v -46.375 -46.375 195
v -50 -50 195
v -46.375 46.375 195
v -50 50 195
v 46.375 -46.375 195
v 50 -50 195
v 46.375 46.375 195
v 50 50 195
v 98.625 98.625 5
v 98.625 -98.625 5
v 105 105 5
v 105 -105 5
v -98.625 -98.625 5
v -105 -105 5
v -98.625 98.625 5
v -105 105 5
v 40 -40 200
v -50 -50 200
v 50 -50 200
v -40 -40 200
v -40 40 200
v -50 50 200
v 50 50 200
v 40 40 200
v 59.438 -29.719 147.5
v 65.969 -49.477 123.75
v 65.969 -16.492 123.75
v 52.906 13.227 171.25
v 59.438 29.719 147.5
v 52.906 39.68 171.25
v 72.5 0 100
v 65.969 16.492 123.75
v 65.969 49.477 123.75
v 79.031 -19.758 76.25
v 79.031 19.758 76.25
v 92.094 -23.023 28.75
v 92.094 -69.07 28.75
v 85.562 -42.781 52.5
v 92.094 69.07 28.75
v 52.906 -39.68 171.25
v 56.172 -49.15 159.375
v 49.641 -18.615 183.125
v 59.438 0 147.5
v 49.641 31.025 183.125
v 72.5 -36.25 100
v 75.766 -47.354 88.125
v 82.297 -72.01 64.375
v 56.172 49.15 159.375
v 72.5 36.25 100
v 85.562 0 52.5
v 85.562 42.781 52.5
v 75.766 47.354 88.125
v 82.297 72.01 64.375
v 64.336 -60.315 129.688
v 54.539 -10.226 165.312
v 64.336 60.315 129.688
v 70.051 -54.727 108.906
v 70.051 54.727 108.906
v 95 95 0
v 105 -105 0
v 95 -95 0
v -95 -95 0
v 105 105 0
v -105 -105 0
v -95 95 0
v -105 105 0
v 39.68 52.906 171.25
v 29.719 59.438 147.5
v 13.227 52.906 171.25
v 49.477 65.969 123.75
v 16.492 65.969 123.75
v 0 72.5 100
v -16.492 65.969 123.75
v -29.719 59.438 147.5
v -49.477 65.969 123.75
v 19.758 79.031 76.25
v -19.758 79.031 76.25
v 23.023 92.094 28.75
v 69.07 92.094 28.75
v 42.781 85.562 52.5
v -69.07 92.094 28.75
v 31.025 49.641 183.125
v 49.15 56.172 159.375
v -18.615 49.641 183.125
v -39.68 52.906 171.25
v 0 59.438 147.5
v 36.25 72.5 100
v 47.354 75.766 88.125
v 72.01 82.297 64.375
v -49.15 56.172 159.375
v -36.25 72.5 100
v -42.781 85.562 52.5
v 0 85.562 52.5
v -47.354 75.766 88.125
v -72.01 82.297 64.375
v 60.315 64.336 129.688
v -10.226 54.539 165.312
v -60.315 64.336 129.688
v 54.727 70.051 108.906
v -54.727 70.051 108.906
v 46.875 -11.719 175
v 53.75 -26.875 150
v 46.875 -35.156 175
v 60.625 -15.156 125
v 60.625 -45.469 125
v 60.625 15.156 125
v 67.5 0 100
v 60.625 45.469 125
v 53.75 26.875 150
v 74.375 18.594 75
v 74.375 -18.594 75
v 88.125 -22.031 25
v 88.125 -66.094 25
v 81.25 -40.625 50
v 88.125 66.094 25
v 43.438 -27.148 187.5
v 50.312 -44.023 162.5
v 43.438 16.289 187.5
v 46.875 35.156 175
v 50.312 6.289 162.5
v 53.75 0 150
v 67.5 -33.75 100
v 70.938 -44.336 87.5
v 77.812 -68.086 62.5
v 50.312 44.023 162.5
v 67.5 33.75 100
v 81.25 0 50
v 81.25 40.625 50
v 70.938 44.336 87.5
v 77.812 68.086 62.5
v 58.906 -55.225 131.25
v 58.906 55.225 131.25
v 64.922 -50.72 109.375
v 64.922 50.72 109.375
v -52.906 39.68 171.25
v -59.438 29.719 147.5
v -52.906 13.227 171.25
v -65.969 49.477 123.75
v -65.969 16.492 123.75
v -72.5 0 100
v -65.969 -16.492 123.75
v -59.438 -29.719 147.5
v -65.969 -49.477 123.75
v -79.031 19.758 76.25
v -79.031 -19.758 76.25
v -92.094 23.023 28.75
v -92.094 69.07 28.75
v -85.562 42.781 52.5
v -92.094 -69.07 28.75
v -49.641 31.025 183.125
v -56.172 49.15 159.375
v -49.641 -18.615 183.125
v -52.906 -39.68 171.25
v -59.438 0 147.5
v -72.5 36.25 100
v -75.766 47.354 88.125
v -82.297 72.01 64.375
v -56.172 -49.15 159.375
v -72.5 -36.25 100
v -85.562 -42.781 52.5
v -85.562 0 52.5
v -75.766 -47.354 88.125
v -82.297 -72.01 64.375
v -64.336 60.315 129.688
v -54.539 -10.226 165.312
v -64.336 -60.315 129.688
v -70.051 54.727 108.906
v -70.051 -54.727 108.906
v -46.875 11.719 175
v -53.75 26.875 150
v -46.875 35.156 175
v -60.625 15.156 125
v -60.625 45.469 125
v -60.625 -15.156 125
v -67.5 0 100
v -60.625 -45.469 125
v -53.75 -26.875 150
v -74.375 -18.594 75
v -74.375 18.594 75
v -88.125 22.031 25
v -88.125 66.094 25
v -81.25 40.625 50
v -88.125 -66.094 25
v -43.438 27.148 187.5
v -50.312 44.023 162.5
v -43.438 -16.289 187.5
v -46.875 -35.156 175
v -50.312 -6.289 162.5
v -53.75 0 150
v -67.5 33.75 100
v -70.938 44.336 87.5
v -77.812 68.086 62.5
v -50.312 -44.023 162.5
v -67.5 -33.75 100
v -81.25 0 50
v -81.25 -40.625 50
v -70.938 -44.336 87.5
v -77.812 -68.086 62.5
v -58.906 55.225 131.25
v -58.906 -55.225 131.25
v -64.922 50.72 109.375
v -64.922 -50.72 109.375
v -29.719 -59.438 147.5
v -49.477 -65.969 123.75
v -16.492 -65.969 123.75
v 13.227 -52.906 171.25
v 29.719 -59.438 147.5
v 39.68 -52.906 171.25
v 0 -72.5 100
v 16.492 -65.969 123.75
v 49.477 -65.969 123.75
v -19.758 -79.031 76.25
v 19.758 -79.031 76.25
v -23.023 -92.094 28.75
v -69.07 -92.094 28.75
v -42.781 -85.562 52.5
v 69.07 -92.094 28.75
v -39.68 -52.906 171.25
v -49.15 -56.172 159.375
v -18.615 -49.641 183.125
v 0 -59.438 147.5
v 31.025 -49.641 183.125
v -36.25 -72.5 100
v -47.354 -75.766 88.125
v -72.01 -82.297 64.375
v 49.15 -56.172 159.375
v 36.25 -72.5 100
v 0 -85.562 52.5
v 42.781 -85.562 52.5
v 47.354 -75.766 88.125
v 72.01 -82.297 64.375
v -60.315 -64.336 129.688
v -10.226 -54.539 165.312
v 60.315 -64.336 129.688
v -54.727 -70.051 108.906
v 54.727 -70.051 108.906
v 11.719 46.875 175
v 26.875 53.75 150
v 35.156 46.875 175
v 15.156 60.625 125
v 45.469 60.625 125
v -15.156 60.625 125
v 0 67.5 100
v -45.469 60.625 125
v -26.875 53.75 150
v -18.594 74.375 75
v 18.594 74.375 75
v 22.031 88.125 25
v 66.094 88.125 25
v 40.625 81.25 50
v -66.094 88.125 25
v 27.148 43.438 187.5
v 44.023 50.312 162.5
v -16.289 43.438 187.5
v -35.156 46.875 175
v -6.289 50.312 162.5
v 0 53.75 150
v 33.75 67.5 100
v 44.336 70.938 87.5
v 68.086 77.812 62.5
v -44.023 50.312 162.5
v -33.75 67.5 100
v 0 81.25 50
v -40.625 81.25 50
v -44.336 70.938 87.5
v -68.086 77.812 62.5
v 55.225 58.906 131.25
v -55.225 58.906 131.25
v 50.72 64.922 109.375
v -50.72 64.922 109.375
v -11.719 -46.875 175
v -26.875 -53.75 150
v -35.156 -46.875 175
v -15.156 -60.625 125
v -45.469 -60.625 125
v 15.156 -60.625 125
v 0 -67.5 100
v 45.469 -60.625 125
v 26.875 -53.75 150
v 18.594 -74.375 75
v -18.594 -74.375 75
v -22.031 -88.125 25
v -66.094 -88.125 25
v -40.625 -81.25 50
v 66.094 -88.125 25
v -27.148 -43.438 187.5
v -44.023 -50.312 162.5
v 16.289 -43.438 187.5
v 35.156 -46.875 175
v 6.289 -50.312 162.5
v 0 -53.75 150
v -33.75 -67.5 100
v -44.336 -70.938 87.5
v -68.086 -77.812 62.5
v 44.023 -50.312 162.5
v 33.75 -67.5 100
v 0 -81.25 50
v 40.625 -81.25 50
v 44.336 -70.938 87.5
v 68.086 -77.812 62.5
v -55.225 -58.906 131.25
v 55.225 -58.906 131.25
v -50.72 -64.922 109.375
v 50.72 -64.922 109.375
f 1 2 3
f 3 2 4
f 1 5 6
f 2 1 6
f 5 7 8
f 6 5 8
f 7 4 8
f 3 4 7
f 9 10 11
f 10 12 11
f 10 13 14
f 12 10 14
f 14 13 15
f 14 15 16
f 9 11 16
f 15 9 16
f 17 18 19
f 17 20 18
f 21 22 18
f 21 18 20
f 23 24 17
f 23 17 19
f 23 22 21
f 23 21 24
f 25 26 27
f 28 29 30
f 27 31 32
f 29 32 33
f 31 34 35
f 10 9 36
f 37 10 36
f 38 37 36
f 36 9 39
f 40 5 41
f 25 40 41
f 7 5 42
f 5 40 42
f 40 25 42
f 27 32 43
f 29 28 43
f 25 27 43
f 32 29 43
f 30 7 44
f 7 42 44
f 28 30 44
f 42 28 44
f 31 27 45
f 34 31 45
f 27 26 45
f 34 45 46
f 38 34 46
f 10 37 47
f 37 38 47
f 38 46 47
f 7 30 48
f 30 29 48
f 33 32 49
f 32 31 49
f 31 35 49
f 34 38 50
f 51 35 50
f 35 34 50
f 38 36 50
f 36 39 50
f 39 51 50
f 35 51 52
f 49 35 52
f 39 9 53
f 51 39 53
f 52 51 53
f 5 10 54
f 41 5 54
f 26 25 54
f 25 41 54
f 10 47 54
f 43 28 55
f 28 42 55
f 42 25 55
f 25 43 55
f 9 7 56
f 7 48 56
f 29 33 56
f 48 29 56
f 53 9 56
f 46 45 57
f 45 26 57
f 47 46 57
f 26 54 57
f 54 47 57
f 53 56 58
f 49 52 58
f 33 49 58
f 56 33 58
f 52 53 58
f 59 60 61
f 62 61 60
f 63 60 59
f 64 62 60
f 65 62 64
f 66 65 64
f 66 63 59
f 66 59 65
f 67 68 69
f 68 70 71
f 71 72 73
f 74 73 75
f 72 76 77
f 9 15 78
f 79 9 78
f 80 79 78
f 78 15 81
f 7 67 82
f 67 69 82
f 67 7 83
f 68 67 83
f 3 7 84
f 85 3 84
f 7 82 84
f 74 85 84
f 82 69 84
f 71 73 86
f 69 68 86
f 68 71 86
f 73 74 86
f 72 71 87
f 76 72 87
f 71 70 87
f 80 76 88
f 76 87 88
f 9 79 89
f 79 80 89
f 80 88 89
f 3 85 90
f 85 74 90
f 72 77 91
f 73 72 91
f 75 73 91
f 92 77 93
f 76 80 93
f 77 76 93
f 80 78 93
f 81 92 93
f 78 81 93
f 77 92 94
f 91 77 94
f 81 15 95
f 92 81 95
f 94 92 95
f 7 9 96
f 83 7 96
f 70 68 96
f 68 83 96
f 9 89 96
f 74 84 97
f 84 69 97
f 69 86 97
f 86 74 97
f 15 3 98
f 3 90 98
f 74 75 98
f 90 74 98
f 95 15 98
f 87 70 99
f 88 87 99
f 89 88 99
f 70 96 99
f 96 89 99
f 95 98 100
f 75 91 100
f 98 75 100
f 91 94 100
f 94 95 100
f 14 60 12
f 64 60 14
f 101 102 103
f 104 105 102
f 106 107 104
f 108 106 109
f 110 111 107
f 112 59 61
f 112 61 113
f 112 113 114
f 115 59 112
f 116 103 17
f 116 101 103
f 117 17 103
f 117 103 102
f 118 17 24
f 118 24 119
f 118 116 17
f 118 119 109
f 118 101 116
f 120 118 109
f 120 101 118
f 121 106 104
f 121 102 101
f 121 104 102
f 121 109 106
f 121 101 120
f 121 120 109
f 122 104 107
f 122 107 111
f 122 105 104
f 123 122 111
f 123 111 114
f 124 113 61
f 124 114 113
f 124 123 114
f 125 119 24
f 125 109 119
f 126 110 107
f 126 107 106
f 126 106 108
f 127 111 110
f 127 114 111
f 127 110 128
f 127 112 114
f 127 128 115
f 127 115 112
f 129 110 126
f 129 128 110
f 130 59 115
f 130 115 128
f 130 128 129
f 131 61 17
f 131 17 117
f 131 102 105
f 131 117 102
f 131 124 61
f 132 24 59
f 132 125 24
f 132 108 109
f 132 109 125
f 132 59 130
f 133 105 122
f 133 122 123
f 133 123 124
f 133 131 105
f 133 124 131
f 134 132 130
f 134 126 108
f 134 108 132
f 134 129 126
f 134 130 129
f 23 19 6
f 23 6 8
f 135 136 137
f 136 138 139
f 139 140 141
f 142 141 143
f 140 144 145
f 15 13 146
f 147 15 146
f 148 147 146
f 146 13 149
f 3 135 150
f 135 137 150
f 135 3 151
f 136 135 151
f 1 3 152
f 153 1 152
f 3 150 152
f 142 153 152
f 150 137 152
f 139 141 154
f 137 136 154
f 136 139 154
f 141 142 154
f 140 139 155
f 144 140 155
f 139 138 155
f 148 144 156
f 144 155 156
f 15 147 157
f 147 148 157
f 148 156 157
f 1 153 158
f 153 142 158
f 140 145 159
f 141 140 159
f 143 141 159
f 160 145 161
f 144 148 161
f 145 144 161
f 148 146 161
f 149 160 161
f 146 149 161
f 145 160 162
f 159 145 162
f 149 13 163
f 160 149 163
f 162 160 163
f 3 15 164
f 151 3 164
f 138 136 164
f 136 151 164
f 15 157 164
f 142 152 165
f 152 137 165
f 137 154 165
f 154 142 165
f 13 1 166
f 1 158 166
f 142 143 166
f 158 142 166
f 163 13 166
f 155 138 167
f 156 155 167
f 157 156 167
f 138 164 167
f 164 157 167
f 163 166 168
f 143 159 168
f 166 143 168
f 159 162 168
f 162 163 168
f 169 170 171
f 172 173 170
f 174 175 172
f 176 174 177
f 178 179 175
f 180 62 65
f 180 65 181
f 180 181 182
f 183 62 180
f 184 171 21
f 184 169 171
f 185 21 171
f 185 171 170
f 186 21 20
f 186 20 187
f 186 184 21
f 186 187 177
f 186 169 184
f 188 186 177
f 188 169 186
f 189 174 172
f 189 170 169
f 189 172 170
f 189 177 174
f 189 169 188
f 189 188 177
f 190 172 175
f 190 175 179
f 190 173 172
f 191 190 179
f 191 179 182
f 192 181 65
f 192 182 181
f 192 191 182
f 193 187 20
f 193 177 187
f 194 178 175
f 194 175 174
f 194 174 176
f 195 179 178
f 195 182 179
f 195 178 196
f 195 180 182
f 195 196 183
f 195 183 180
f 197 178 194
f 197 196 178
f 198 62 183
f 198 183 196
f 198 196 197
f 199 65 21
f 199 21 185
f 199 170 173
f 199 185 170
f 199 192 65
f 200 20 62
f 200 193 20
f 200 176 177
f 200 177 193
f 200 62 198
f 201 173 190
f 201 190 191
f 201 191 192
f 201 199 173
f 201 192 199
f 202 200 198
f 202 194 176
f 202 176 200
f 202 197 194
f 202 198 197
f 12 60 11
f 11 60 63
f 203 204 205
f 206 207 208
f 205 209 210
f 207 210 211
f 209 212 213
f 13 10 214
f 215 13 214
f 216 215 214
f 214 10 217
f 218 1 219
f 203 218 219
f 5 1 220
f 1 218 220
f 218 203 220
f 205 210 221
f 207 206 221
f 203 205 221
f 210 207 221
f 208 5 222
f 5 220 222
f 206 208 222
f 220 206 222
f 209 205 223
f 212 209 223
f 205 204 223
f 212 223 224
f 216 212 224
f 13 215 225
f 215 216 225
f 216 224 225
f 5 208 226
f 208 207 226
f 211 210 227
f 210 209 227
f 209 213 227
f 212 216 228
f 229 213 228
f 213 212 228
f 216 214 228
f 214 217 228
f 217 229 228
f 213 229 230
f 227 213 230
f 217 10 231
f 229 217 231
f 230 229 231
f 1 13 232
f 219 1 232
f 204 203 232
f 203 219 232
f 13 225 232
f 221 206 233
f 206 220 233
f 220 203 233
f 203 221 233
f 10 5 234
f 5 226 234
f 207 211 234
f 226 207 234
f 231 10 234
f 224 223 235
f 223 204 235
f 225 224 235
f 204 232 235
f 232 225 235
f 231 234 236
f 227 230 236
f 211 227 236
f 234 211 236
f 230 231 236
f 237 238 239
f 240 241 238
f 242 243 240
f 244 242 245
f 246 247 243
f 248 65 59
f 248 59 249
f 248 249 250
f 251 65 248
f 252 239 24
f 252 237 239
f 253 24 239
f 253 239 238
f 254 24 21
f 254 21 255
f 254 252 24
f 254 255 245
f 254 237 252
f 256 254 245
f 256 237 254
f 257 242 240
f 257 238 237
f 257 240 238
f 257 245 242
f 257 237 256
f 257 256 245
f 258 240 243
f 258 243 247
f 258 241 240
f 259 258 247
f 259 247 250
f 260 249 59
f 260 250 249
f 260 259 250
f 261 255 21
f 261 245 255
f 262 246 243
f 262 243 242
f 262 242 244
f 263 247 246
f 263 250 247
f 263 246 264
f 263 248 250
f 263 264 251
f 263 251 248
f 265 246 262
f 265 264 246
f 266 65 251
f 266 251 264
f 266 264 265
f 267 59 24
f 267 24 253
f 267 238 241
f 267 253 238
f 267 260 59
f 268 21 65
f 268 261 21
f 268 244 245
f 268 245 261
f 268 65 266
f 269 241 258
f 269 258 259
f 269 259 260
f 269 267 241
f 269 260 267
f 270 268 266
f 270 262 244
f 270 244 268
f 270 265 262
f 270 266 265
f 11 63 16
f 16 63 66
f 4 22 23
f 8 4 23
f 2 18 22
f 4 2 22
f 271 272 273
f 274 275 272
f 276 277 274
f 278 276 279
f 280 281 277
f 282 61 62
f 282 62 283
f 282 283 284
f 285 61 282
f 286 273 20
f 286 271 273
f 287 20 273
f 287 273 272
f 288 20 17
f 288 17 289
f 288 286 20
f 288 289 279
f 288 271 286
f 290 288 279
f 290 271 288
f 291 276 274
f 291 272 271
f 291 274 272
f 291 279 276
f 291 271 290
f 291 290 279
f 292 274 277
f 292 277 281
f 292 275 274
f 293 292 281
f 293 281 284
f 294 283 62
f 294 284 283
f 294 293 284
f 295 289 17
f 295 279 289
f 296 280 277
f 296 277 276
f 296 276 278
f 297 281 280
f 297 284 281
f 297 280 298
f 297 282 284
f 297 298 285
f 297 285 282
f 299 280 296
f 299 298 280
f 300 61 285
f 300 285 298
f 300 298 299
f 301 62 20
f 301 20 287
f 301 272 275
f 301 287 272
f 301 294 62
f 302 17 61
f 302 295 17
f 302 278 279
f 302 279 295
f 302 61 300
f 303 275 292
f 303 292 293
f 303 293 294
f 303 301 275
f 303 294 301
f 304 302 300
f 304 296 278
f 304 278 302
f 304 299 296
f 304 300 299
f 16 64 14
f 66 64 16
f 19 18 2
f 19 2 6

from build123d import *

# Parameters (mm, degrees)
SKETCH2_W           = 90
SKETCH2_H           = 90
SKETCH1_W           = 200
SKETCH1_H           = 200
SKETCH6_W           = 210
SKETCH6_H           = 210
BOSS_EXTRUDE1_DEPTH = 5
SKETCH5_W           = 100
SKETCH5_H           = 100
BOSS_EXTRUDE2_DEPTH = 5
SKETCH3_W           = 80
SKETCH3_H           = 80
SKETCH4_W           = 190
SKETCH4_H           = 190


with BuildPart() as part:
    # Sketch2 → Loft2 section 0
    with BuildSketch(Plane.XY.offset(200)):
        Rectangle(SKETCH2_W, SKETCH2_H)
    # Sketch1 → Loft2 section 1
    with BuildSketch(Plane.XY):
        Rectangle(SKETCH1_W, SKETCH1_H)
    loft()

    # Sketch6 → Boss-Extrude1 (add)
    with BuildSketch(Plane(origin=(0, 0, 0), x_dir=(-1, 0, 0), z_dir=(0, 0, -1))):
        Rectangle(SKETCH6_W, SKETCH6_H)
    extrude(amount=-BOSS_EXTRUDE1_DEPTH)

    # Sketch5 → Boss-Extrude2 (add)
    with BuildSketch(Plane.XY.offset(200)):
        Rectangle(SKETCH5_W, SKETCH5_H)
    extrude(amount=-BOSS_EXTRUDE2_DEPTH)

    # Sketch3 → Cut-Loft2 section 0
    with BuildSketch(Plane.XY.offset(200)):
        Rectangle(SKETCH3_W, SKETCH3_H)
    # Sketch4 → Cut-Loft2 section 1
    with BuildSketch(Plane(origin=(0, 0, 0), x_dir=(-1, 0, 0), z_dir=(0, 0, -1))):
        Rectangle(SKETCH4_W, SKETCH4_H)
    loft(mode=Mode.SUBTRACT)


solid = part.part
